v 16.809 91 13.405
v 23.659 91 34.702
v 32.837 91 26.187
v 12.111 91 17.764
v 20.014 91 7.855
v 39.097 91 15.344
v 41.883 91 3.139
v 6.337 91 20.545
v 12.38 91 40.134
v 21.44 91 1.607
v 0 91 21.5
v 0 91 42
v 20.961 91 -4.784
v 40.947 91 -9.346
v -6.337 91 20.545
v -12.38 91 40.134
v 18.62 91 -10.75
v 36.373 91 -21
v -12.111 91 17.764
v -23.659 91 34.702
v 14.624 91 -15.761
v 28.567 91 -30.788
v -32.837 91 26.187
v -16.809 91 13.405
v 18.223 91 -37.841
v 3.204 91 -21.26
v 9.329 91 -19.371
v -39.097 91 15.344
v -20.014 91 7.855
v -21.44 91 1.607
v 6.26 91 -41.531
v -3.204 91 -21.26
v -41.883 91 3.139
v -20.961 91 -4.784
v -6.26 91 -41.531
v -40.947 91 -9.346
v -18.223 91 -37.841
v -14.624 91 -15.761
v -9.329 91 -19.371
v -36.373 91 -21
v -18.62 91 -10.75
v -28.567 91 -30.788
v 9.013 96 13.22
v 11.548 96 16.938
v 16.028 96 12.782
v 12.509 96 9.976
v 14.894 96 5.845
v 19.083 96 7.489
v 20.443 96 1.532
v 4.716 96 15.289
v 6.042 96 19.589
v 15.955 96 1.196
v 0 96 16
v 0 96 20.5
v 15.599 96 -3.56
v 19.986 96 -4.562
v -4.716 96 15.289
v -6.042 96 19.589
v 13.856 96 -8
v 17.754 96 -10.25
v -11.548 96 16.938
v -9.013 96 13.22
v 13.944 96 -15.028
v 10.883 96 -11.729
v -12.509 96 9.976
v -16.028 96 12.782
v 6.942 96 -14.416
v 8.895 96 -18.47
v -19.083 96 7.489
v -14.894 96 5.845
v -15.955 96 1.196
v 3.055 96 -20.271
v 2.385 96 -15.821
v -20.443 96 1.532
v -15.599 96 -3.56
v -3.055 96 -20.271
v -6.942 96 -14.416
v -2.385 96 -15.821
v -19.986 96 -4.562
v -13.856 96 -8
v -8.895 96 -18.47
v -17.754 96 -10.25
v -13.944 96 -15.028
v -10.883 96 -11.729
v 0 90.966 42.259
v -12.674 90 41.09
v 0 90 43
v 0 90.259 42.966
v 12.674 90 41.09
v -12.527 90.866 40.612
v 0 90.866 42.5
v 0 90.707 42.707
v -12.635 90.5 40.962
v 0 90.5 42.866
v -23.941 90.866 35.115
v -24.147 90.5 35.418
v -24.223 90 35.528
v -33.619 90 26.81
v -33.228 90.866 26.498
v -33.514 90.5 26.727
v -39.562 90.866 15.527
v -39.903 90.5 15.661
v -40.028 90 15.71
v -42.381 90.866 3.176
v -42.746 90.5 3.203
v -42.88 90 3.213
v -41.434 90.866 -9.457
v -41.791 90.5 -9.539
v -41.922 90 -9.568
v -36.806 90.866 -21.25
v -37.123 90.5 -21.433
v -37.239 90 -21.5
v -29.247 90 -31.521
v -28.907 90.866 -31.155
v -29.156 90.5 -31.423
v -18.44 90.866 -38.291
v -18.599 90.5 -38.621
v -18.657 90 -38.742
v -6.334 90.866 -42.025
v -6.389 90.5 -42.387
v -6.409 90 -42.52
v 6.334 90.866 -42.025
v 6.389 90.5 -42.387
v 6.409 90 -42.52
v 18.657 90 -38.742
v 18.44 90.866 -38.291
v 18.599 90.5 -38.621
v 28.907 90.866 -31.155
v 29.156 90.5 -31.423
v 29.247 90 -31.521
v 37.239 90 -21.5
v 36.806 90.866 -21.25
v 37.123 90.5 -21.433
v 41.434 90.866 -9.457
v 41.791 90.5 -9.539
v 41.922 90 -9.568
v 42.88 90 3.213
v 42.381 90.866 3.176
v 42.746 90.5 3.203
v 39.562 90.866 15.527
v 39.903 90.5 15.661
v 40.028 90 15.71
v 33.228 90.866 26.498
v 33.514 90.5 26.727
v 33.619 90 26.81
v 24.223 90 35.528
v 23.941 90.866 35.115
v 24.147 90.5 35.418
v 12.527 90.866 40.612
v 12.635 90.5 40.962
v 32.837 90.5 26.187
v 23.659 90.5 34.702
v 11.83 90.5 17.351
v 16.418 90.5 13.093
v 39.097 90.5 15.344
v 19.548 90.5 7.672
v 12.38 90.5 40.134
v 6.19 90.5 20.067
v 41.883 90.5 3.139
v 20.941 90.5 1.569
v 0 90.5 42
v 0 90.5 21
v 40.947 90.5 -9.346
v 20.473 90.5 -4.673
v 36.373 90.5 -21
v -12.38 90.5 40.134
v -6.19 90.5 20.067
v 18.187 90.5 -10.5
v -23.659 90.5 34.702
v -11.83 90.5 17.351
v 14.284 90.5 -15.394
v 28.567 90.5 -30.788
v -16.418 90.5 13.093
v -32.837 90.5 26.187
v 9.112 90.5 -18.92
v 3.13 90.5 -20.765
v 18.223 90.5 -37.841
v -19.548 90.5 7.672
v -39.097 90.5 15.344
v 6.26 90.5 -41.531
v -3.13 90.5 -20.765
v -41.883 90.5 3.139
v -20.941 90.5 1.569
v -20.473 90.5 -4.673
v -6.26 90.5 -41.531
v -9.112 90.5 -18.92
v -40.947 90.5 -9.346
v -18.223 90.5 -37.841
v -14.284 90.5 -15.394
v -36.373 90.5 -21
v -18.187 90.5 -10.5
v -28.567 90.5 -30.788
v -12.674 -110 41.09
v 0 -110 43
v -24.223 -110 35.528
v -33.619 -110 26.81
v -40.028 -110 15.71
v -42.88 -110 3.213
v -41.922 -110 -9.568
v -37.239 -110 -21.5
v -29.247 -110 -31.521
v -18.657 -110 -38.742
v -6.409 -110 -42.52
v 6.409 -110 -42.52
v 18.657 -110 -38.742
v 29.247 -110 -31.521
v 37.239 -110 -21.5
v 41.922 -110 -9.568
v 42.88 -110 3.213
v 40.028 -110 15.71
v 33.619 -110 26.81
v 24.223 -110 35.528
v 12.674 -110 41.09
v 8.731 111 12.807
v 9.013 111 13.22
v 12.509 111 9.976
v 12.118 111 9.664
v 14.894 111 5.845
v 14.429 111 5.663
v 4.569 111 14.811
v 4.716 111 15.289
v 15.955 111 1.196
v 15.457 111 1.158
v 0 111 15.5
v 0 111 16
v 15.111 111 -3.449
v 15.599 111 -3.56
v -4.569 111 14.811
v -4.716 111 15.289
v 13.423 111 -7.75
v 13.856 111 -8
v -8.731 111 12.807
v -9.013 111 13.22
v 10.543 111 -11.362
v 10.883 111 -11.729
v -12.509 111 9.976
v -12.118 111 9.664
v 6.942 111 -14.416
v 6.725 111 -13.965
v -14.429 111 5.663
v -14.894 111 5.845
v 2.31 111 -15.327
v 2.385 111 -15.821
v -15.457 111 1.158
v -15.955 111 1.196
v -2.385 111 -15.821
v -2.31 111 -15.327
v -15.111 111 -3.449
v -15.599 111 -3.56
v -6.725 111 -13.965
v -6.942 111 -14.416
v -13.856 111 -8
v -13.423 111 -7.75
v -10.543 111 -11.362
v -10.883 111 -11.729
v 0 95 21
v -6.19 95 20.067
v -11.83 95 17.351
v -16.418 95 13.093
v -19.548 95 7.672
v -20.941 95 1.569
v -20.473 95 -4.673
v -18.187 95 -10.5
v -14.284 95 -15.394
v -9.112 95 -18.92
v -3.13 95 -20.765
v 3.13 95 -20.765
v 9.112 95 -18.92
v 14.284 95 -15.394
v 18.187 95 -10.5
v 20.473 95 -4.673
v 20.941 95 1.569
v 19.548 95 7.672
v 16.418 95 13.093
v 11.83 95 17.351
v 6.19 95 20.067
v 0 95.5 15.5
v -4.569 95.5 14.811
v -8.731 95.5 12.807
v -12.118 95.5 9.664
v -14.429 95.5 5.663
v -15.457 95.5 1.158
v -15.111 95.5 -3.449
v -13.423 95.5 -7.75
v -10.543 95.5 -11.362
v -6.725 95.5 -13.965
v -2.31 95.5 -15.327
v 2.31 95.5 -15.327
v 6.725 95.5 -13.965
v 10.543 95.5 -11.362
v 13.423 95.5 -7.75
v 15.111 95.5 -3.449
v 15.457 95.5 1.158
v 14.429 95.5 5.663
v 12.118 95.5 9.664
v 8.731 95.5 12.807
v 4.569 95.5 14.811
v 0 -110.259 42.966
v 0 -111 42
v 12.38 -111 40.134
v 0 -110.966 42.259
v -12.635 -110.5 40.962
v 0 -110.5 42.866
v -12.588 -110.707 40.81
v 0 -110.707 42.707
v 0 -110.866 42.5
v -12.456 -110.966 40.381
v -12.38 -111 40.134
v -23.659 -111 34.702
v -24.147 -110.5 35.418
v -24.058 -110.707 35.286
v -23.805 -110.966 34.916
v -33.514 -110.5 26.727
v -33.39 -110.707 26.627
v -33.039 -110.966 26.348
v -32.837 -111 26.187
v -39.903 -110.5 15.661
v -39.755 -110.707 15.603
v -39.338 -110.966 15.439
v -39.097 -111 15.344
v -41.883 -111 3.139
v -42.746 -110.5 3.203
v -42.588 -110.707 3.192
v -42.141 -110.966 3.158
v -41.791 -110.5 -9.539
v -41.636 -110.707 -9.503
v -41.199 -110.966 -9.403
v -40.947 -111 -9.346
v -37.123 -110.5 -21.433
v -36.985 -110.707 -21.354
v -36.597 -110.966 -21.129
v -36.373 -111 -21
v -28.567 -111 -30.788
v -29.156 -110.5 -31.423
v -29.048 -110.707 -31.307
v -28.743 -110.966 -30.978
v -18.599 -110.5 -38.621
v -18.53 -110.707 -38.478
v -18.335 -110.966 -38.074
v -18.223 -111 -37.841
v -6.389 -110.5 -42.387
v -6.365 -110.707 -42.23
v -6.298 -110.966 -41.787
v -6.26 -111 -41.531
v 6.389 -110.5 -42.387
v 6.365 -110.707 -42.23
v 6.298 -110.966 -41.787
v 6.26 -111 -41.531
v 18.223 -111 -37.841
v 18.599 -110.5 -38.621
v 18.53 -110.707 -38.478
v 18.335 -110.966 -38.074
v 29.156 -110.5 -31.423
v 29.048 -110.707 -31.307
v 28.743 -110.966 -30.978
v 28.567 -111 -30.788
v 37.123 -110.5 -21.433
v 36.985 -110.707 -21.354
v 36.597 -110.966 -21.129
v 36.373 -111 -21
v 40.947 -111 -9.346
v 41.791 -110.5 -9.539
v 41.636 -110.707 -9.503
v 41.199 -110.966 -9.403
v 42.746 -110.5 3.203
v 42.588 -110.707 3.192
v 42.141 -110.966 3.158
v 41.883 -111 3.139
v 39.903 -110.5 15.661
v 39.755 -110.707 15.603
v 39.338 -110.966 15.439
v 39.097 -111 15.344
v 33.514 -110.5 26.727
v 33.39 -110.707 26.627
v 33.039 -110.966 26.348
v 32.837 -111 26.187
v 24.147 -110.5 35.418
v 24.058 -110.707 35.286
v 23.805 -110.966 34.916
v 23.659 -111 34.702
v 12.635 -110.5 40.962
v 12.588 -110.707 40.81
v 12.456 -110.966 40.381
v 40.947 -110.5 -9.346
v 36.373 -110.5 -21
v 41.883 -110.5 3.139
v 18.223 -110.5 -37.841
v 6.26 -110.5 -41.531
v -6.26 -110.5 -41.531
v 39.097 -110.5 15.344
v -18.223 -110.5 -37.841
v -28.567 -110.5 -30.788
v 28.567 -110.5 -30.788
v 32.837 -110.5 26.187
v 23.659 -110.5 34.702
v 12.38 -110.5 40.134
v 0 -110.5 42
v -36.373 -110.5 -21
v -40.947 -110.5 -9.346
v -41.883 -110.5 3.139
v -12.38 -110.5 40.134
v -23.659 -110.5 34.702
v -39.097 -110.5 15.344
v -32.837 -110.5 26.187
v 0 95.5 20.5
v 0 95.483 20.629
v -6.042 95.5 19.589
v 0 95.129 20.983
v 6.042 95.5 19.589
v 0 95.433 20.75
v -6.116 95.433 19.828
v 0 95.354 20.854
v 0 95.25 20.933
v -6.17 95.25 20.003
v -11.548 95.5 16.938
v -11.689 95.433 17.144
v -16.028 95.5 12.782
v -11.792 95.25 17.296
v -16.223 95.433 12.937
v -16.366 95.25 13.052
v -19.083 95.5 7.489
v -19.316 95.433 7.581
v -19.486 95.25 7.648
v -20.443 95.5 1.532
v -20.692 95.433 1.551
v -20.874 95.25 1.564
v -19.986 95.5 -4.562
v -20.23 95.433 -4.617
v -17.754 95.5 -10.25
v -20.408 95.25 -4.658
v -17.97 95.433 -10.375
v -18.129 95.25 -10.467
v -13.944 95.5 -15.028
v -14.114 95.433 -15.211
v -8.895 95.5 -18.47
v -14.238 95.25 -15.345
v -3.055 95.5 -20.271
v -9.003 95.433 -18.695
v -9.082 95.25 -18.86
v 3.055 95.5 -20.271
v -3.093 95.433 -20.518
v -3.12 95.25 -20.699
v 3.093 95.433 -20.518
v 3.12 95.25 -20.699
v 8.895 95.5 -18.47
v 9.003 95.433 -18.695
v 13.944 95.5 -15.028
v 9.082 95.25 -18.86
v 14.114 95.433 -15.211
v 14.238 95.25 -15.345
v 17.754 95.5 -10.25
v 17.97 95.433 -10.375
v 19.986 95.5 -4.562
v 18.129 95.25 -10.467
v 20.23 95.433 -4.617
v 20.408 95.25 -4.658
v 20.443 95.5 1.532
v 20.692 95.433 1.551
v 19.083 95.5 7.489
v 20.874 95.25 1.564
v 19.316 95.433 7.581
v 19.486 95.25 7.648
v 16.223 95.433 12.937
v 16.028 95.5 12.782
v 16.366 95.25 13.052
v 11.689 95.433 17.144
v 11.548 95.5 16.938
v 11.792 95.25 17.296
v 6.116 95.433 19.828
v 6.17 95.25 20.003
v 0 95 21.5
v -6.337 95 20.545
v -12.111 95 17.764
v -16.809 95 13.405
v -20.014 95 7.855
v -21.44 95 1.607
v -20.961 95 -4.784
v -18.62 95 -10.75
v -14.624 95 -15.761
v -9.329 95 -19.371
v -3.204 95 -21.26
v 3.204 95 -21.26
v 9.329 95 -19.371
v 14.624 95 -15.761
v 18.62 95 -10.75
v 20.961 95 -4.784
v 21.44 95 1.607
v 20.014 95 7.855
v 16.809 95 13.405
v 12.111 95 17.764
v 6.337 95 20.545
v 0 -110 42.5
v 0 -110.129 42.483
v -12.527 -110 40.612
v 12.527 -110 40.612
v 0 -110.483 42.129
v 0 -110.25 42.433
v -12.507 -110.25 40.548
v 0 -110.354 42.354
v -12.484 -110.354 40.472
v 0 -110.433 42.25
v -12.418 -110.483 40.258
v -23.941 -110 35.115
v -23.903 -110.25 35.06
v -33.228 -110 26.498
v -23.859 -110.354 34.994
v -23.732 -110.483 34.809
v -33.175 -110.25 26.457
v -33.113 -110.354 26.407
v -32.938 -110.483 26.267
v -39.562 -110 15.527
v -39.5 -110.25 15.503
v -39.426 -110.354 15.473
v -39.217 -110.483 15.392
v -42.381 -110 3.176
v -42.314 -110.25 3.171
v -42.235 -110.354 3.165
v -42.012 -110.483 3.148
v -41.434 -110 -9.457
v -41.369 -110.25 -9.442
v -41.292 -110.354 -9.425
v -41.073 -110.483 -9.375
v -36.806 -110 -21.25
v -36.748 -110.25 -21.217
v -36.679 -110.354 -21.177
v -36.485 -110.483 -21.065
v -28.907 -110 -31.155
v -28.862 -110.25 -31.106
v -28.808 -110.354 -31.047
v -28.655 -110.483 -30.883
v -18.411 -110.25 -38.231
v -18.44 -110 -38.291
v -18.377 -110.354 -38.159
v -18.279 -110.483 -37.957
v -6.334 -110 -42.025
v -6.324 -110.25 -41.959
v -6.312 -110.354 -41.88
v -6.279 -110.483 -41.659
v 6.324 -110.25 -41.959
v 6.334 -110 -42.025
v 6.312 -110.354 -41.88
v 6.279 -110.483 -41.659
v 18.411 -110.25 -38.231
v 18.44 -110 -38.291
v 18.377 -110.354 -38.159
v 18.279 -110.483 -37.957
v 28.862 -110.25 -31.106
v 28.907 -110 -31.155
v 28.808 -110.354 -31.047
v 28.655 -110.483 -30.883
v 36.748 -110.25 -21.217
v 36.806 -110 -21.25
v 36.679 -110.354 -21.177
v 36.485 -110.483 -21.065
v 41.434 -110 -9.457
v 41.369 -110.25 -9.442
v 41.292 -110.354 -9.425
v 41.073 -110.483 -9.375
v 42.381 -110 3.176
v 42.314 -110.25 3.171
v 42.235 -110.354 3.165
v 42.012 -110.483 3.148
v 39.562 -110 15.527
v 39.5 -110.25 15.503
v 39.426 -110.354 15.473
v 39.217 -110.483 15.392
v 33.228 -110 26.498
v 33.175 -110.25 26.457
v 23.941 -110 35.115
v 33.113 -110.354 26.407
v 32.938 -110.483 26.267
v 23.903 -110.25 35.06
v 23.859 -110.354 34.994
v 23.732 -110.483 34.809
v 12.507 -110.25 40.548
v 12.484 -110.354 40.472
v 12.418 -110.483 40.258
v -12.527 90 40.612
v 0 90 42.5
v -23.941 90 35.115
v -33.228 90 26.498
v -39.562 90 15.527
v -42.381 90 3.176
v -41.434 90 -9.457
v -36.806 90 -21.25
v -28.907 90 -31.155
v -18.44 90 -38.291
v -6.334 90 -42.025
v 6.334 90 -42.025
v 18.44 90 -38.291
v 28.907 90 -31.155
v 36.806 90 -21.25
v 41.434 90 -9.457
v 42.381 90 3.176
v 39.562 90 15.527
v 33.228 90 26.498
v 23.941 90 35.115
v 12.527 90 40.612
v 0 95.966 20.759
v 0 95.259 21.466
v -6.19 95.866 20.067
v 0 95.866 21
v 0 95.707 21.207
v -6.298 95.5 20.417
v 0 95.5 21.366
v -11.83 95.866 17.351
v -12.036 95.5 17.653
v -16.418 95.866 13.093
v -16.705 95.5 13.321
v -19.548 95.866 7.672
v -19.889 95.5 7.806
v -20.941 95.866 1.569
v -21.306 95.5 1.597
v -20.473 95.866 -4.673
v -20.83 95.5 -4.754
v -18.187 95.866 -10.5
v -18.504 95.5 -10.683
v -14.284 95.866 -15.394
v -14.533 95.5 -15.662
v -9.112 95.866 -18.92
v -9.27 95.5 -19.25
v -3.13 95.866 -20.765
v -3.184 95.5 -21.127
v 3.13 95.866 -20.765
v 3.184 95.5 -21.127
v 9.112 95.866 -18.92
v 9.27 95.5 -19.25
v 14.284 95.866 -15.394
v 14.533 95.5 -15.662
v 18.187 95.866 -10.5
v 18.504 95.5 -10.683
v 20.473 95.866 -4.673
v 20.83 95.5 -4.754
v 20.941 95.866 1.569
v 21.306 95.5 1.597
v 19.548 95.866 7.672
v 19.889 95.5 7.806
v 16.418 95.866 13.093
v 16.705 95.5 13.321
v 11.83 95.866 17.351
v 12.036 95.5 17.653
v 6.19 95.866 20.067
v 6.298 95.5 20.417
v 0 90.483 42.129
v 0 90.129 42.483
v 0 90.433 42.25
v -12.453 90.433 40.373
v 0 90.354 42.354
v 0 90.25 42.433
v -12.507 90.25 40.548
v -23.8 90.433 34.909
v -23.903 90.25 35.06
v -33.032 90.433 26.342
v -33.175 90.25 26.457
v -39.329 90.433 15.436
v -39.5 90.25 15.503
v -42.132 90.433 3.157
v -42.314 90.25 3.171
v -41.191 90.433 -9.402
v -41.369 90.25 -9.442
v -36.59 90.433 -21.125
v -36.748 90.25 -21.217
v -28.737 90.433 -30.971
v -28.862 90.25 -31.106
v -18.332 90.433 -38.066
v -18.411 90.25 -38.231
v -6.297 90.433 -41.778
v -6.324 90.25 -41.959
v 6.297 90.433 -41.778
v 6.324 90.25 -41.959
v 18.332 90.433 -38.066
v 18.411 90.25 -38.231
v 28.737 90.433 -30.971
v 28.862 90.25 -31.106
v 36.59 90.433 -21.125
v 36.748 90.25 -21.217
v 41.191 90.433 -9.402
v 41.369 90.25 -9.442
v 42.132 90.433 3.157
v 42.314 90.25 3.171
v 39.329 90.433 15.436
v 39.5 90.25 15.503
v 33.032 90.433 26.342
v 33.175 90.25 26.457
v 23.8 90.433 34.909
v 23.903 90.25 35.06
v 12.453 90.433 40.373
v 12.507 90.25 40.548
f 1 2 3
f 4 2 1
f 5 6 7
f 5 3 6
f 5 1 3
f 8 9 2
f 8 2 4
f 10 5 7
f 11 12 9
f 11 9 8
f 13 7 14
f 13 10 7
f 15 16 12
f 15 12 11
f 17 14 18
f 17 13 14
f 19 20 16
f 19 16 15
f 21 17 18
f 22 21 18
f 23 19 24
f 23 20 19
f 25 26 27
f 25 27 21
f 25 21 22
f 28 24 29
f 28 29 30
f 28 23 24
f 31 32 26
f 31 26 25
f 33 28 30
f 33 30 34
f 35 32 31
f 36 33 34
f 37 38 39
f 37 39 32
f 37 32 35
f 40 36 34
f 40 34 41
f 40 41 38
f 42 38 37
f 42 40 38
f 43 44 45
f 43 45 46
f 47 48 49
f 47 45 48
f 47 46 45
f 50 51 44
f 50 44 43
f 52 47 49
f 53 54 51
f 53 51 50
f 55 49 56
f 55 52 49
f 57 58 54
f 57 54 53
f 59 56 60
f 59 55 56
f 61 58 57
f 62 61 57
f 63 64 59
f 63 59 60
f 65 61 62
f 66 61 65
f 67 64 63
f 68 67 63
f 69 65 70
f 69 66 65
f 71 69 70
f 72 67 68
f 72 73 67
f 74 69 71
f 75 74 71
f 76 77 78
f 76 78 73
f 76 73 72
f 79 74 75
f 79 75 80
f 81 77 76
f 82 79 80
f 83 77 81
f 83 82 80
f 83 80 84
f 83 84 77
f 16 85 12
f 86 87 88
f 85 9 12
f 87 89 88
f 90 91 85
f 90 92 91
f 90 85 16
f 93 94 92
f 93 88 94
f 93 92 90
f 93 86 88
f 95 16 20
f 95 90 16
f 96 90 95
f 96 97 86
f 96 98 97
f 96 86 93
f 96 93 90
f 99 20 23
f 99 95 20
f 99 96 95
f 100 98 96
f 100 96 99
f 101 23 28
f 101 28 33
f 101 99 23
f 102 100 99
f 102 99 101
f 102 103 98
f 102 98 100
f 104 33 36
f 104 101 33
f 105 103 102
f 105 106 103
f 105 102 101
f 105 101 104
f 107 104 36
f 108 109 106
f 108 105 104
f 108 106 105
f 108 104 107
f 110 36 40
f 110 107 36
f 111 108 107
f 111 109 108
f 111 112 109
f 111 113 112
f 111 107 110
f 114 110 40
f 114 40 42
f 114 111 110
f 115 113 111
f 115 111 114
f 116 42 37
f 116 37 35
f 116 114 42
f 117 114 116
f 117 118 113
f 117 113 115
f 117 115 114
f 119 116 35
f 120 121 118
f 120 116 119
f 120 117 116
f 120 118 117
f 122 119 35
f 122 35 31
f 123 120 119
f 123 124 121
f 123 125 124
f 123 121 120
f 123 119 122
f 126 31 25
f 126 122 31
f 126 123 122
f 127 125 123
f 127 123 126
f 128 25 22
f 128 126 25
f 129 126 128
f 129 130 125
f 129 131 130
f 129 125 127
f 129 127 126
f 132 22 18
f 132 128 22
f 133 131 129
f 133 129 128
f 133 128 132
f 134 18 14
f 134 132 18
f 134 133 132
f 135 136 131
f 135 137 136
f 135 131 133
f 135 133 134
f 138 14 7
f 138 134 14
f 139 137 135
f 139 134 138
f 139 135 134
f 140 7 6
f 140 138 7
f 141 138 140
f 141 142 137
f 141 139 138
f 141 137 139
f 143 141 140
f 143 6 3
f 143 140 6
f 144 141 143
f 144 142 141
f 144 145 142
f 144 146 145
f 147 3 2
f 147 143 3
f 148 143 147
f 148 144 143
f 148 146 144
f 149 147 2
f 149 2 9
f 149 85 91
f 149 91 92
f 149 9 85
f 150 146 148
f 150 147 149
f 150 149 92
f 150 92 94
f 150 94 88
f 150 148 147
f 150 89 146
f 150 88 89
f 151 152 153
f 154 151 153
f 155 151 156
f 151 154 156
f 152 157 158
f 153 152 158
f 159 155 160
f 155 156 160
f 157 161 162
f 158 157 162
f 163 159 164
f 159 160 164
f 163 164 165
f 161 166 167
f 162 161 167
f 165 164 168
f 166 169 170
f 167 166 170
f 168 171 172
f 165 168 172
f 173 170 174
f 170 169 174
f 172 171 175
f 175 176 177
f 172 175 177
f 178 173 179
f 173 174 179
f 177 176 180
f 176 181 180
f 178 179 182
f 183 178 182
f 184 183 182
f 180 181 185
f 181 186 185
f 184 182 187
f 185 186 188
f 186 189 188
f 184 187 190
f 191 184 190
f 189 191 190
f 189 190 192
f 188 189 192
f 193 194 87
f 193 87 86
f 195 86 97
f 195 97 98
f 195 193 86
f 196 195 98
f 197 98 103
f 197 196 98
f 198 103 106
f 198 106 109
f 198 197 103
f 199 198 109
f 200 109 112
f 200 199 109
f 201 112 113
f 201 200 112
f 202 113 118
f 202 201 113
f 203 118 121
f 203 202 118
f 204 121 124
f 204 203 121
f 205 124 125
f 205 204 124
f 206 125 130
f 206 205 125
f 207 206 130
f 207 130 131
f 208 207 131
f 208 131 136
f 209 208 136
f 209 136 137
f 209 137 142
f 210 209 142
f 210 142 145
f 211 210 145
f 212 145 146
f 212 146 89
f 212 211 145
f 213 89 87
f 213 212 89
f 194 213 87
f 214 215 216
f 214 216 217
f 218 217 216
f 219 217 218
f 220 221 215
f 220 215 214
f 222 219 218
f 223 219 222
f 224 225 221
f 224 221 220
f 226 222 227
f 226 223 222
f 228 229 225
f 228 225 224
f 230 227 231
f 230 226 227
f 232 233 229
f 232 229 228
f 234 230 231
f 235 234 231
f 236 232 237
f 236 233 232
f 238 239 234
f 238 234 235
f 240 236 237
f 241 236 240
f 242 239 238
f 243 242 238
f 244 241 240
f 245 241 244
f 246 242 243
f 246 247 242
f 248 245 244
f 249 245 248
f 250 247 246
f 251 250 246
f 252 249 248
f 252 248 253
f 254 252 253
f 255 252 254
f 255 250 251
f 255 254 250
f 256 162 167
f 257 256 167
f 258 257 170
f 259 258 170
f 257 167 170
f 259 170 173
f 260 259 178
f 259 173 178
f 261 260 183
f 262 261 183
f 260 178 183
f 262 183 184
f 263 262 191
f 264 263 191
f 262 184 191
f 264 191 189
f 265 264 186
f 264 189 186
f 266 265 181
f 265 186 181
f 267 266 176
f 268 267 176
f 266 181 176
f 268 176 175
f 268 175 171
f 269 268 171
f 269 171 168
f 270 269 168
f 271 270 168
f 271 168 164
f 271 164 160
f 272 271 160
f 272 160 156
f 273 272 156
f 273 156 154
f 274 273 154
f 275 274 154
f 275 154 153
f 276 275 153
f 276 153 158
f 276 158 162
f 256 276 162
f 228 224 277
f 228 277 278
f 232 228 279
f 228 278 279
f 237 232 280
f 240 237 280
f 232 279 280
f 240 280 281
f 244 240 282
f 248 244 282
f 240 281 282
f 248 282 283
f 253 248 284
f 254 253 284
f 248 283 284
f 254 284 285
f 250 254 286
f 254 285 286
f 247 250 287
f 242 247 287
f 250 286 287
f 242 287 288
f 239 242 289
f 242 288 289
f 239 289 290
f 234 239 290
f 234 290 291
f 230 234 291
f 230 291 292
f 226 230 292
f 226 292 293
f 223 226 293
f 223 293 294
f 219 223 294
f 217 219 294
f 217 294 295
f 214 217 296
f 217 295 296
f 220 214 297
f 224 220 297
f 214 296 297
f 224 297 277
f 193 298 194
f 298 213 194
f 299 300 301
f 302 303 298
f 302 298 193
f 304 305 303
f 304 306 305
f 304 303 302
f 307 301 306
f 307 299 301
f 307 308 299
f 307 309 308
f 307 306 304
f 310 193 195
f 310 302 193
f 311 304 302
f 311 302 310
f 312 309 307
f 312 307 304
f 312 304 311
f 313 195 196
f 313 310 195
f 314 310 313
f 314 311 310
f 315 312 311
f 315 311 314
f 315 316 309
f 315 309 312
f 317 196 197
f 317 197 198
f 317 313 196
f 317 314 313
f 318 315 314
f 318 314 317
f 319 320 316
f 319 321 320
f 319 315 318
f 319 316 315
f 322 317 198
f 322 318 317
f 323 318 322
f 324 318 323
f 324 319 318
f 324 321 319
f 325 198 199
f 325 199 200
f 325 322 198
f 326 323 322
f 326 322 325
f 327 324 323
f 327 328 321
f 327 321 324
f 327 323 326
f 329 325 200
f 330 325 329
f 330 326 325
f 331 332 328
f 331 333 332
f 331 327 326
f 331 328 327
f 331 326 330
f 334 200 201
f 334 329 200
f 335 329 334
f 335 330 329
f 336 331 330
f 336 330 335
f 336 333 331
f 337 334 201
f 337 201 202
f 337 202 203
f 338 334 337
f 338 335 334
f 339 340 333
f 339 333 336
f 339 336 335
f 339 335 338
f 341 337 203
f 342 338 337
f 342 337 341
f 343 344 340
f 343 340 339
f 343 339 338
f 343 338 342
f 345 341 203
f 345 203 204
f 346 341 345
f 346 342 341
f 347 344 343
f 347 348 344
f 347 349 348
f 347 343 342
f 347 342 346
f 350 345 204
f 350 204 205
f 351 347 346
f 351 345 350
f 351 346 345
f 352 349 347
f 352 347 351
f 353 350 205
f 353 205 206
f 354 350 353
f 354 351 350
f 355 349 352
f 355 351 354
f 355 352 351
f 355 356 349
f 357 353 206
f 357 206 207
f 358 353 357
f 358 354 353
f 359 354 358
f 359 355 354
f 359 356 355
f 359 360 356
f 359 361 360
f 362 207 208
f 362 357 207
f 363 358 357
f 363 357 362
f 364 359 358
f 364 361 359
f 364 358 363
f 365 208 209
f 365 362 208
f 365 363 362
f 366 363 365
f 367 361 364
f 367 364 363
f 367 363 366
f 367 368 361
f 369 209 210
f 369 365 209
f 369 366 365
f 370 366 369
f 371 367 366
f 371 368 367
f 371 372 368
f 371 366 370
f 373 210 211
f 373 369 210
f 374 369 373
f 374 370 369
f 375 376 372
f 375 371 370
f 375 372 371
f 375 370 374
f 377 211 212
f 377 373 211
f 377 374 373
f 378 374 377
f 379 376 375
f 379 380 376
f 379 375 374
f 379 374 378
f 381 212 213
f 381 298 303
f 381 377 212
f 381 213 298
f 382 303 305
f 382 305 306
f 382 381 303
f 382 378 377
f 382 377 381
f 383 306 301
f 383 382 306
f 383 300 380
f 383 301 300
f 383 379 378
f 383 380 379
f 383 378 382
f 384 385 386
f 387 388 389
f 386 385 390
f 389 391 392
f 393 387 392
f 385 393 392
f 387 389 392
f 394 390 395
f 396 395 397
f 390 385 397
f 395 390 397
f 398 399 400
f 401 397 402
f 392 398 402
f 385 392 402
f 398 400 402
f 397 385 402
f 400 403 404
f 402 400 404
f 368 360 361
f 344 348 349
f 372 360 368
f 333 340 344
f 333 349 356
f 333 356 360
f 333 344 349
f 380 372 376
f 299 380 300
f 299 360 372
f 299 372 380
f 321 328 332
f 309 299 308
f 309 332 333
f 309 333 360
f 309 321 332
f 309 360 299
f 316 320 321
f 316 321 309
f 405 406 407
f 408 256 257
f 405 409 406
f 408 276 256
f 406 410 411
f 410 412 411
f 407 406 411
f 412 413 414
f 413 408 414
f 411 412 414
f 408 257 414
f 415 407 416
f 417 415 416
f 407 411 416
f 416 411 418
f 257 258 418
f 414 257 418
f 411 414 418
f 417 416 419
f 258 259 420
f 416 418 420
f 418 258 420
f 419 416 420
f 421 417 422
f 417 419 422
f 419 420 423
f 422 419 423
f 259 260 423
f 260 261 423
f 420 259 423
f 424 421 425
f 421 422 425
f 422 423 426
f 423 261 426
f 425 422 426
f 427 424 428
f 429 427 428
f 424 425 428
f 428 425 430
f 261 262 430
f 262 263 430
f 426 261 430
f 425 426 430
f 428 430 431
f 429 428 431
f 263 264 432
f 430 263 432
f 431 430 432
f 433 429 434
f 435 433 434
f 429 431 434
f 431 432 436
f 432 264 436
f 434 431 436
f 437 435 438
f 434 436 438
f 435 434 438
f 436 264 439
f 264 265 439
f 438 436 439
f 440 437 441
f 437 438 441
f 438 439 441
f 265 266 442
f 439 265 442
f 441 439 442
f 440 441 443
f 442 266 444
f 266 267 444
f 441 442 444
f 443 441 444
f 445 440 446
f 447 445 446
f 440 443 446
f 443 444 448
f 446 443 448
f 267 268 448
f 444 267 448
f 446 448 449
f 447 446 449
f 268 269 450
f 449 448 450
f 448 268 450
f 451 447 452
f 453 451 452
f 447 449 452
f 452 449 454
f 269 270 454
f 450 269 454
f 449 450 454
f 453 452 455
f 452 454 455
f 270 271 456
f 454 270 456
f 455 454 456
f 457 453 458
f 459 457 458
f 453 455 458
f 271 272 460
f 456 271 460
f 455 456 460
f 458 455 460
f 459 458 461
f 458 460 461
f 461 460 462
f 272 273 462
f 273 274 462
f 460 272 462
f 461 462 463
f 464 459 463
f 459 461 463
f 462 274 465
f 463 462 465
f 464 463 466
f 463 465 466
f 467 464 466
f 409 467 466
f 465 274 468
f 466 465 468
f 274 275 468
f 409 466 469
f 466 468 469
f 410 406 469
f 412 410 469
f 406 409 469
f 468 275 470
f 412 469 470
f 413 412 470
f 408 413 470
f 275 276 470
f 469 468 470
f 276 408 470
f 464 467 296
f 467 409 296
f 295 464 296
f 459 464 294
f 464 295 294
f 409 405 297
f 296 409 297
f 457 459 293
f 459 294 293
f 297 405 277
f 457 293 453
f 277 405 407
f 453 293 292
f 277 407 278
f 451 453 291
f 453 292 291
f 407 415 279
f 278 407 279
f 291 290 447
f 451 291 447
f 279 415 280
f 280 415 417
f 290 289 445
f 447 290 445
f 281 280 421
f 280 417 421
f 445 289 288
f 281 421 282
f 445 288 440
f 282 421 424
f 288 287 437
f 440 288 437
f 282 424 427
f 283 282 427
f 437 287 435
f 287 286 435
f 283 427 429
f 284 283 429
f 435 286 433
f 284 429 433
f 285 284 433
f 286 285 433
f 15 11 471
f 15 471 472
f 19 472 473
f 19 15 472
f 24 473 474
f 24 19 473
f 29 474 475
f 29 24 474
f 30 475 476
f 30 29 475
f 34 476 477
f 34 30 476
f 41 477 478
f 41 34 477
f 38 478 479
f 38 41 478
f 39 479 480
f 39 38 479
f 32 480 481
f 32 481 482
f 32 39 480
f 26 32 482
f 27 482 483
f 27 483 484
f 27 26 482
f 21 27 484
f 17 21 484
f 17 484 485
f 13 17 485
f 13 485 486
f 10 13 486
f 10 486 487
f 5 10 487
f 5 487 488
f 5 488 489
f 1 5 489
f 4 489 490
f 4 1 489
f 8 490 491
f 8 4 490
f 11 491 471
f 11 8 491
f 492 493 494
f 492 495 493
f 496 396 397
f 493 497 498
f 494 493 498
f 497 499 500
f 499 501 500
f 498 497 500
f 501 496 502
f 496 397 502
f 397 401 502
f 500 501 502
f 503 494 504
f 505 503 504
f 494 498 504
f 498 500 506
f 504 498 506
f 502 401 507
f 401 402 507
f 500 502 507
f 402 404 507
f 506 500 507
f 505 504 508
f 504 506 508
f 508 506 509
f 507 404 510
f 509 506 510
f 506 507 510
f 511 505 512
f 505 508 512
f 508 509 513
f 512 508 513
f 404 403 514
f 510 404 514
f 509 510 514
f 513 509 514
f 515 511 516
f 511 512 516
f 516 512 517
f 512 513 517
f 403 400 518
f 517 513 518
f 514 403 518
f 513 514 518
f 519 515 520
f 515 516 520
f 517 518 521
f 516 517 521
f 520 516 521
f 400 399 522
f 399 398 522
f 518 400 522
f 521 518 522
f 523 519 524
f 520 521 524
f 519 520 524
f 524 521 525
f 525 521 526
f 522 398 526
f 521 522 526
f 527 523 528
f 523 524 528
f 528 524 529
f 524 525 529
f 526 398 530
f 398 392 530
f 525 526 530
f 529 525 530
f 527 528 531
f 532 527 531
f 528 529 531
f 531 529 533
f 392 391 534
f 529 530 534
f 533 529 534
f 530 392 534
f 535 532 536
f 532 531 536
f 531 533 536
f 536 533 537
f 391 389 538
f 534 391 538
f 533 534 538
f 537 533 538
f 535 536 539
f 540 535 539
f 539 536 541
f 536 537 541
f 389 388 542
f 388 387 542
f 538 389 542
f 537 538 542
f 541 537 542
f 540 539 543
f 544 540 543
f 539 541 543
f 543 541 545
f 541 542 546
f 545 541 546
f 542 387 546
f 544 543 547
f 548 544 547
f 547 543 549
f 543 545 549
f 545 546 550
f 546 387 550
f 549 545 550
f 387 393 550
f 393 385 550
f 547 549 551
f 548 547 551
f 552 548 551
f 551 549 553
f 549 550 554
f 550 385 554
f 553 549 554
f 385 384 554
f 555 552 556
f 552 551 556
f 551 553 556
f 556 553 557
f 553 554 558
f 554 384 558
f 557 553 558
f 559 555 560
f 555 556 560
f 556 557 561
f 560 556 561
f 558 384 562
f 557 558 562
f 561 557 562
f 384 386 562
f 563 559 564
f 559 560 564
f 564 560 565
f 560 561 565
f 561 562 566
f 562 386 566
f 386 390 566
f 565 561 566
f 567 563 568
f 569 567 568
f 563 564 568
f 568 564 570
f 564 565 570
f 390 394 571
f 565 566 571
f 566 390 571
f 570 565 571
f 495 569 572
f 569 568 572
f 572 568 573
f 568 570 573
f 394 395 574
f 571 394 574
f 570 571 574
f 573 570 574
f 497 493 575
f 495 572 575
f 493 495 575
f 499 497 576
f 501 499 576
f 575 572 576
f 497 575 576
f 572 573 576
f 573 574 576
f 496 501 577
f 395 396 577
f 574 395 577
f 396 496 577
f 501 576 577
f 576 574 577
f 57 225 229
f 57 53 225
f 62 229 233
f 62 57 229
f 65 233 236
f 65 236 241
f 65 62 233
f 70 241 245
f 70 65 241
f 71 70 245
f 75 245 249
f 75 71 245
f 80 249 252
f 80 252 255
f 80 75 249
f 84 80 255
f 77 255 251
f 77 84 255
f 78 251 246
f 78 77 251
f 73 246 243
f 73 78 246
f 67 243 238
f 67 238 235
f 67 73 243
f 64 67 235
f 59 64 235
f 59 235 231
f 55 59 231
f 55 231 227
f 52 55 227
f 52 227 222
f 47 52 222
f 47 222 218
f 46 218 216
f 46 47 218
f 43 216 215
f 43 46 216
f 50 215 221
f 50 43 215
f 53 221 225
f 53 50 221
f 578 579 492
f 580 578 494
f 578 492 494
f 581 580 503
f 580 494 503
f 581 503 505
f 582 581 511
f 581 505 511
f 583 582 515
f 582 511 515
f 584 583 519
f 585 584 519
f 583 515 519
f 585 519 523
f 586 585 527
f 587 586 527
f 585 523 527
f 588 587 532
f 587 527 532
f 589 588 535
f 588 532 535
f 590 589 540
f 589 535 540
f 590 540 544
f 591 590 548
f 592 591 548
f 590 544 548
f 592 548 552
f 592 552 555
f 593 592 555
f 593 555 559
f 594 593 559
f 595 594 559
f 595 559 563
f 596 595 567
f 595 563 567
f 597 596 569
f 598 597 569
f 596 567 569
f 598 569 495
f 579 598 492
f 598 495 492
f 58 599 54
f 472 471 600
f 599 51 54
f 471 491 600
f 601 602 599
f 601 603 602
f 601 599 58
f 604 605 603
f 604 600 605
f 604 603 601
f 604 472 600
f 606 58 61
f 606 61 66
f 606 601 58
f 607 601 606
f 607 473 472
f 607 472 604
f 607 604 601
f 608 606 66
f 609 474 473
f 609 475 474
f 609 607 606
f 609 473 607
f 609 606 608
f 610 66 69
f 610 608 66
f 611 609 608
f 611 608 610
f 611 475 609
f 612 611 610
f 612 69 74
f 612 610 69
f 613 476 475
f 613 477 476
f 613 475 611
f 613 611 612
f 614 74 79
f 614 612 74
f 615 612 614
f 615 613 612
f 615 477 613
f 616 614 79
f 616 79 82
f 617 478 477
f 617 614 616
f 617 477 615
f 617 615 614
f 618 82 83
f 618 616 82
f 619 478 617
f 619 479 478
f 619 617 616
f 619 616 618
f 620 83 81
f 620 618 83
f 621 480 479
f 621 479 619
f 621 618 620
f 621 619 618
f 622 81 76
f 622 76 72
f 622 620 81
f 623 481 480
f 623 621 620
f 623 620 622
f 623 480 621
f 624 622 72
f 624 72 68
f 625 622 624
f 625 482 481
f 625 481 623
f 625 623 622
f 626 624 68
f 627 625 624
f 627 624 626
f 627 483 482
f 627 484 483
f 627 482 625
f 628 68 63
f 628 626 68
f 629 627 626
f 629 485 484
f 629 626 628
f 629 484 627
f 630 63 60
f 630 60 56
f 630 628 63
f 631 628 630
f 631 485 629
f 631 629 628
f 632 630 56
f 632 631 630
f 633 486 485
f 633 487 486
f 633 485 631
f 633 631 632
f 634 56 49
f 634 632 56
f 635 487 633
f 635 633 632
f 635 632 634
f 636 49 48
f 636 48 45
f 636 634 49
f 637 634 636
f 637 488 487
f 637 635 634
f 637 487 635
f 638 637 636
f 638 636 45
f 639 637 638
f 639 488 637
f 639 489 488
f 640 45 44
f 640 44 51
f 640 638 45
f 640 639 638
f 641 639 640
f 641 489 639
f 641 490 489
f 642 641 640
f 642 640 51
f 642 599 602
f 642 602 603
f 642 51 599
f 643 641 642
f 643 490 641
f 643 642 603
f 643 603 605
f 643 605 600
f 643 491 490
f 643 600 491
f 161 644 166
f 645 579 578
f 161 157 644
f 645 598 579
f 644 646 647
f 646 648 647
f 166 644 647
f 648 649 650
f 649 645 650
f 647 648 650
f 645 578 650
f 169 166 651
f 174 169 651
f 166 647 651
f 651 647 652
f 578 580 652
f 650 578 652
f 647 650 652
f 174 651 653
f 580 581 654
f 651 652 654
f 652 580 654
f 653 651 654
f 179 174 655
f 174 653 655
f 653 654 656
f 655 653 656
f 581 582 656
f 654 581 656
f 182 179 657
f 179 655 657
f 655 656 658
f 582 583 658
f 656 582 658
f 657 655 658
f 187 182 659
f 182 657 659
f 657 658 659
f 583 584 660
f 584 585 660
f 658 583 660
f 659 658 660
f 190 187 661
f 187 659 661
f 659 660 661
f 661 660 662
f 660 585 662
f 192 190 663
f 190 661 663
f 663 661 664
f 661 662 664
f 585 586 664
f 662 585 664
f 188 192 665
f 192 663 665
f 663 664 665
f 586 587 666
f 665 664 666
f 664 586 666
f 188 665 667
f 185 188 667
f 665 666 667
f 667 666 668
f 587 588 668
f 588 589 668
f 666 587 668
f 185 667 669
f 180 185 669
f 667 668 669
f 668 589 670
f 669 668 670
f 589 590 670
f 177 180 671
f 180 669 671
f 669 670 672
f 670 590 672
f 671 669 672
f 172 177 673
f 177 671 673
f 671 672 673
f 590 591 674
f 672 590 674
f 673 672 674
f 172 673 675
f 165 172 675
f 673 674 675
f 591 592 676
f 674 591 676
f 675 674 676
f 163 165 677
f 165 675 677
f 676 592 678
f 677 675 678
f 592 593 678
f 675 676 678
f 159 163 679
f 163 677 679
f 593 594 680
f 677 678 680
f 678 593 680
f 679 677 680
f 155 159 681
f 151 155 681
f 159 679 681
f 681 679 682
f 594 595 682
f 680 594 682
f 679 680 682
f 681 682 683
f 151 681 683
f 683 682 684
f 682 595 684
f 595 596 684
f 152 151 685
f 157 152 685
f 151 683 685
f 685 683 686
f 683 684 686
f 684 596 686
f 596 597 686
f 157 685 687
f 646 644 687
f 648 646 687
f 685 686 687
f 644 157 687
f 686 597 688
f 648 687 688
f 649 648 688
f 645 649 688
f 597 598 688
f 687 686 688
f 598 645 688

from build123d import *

# Parameters (mm, degrees)
FILLET_1_R = 1
SHELL_1_T  = -0.5


with BuildPart() as part:
    # 草图2 → 旋转1 (revolve)
    with BuildSketch(Plane.XY, mode=Mode.PRIVATE) as revolve_1_sk:
        Polygon((0, 111), (16, 111), (16, 96), (21.5, 96), (21.5, 91), (43, 91), (43, -111), (0, -111), align=None)
    revolve(revolve_1_sk.sketch.rotate(Axis((0, 36.939473279, 0), (0, -1, 0)), 90), axis=Axis((0, 36.939473279, 0), (0, -1, 0)))

    # 圆角1
    fillet_1_edges = [part.edges().sort_by_distance(p)[0] for p in [
        (0, -111, -43),
        (0, 91, -43),
        (0, 96, -21.5),
    ]]
    fillet(fillet_1_edges, radius=FILLET_1_R)

    # 抽壳1
    shell_1_openings = [part.faces().sort_by_distance(p)[0] for p in [
        (0, 111, 0),
    ]]
    offset(amount=SHELL_1_T, openings=shell_1_openings, kind=Kind.INTERSECTION)


solid = part.part
